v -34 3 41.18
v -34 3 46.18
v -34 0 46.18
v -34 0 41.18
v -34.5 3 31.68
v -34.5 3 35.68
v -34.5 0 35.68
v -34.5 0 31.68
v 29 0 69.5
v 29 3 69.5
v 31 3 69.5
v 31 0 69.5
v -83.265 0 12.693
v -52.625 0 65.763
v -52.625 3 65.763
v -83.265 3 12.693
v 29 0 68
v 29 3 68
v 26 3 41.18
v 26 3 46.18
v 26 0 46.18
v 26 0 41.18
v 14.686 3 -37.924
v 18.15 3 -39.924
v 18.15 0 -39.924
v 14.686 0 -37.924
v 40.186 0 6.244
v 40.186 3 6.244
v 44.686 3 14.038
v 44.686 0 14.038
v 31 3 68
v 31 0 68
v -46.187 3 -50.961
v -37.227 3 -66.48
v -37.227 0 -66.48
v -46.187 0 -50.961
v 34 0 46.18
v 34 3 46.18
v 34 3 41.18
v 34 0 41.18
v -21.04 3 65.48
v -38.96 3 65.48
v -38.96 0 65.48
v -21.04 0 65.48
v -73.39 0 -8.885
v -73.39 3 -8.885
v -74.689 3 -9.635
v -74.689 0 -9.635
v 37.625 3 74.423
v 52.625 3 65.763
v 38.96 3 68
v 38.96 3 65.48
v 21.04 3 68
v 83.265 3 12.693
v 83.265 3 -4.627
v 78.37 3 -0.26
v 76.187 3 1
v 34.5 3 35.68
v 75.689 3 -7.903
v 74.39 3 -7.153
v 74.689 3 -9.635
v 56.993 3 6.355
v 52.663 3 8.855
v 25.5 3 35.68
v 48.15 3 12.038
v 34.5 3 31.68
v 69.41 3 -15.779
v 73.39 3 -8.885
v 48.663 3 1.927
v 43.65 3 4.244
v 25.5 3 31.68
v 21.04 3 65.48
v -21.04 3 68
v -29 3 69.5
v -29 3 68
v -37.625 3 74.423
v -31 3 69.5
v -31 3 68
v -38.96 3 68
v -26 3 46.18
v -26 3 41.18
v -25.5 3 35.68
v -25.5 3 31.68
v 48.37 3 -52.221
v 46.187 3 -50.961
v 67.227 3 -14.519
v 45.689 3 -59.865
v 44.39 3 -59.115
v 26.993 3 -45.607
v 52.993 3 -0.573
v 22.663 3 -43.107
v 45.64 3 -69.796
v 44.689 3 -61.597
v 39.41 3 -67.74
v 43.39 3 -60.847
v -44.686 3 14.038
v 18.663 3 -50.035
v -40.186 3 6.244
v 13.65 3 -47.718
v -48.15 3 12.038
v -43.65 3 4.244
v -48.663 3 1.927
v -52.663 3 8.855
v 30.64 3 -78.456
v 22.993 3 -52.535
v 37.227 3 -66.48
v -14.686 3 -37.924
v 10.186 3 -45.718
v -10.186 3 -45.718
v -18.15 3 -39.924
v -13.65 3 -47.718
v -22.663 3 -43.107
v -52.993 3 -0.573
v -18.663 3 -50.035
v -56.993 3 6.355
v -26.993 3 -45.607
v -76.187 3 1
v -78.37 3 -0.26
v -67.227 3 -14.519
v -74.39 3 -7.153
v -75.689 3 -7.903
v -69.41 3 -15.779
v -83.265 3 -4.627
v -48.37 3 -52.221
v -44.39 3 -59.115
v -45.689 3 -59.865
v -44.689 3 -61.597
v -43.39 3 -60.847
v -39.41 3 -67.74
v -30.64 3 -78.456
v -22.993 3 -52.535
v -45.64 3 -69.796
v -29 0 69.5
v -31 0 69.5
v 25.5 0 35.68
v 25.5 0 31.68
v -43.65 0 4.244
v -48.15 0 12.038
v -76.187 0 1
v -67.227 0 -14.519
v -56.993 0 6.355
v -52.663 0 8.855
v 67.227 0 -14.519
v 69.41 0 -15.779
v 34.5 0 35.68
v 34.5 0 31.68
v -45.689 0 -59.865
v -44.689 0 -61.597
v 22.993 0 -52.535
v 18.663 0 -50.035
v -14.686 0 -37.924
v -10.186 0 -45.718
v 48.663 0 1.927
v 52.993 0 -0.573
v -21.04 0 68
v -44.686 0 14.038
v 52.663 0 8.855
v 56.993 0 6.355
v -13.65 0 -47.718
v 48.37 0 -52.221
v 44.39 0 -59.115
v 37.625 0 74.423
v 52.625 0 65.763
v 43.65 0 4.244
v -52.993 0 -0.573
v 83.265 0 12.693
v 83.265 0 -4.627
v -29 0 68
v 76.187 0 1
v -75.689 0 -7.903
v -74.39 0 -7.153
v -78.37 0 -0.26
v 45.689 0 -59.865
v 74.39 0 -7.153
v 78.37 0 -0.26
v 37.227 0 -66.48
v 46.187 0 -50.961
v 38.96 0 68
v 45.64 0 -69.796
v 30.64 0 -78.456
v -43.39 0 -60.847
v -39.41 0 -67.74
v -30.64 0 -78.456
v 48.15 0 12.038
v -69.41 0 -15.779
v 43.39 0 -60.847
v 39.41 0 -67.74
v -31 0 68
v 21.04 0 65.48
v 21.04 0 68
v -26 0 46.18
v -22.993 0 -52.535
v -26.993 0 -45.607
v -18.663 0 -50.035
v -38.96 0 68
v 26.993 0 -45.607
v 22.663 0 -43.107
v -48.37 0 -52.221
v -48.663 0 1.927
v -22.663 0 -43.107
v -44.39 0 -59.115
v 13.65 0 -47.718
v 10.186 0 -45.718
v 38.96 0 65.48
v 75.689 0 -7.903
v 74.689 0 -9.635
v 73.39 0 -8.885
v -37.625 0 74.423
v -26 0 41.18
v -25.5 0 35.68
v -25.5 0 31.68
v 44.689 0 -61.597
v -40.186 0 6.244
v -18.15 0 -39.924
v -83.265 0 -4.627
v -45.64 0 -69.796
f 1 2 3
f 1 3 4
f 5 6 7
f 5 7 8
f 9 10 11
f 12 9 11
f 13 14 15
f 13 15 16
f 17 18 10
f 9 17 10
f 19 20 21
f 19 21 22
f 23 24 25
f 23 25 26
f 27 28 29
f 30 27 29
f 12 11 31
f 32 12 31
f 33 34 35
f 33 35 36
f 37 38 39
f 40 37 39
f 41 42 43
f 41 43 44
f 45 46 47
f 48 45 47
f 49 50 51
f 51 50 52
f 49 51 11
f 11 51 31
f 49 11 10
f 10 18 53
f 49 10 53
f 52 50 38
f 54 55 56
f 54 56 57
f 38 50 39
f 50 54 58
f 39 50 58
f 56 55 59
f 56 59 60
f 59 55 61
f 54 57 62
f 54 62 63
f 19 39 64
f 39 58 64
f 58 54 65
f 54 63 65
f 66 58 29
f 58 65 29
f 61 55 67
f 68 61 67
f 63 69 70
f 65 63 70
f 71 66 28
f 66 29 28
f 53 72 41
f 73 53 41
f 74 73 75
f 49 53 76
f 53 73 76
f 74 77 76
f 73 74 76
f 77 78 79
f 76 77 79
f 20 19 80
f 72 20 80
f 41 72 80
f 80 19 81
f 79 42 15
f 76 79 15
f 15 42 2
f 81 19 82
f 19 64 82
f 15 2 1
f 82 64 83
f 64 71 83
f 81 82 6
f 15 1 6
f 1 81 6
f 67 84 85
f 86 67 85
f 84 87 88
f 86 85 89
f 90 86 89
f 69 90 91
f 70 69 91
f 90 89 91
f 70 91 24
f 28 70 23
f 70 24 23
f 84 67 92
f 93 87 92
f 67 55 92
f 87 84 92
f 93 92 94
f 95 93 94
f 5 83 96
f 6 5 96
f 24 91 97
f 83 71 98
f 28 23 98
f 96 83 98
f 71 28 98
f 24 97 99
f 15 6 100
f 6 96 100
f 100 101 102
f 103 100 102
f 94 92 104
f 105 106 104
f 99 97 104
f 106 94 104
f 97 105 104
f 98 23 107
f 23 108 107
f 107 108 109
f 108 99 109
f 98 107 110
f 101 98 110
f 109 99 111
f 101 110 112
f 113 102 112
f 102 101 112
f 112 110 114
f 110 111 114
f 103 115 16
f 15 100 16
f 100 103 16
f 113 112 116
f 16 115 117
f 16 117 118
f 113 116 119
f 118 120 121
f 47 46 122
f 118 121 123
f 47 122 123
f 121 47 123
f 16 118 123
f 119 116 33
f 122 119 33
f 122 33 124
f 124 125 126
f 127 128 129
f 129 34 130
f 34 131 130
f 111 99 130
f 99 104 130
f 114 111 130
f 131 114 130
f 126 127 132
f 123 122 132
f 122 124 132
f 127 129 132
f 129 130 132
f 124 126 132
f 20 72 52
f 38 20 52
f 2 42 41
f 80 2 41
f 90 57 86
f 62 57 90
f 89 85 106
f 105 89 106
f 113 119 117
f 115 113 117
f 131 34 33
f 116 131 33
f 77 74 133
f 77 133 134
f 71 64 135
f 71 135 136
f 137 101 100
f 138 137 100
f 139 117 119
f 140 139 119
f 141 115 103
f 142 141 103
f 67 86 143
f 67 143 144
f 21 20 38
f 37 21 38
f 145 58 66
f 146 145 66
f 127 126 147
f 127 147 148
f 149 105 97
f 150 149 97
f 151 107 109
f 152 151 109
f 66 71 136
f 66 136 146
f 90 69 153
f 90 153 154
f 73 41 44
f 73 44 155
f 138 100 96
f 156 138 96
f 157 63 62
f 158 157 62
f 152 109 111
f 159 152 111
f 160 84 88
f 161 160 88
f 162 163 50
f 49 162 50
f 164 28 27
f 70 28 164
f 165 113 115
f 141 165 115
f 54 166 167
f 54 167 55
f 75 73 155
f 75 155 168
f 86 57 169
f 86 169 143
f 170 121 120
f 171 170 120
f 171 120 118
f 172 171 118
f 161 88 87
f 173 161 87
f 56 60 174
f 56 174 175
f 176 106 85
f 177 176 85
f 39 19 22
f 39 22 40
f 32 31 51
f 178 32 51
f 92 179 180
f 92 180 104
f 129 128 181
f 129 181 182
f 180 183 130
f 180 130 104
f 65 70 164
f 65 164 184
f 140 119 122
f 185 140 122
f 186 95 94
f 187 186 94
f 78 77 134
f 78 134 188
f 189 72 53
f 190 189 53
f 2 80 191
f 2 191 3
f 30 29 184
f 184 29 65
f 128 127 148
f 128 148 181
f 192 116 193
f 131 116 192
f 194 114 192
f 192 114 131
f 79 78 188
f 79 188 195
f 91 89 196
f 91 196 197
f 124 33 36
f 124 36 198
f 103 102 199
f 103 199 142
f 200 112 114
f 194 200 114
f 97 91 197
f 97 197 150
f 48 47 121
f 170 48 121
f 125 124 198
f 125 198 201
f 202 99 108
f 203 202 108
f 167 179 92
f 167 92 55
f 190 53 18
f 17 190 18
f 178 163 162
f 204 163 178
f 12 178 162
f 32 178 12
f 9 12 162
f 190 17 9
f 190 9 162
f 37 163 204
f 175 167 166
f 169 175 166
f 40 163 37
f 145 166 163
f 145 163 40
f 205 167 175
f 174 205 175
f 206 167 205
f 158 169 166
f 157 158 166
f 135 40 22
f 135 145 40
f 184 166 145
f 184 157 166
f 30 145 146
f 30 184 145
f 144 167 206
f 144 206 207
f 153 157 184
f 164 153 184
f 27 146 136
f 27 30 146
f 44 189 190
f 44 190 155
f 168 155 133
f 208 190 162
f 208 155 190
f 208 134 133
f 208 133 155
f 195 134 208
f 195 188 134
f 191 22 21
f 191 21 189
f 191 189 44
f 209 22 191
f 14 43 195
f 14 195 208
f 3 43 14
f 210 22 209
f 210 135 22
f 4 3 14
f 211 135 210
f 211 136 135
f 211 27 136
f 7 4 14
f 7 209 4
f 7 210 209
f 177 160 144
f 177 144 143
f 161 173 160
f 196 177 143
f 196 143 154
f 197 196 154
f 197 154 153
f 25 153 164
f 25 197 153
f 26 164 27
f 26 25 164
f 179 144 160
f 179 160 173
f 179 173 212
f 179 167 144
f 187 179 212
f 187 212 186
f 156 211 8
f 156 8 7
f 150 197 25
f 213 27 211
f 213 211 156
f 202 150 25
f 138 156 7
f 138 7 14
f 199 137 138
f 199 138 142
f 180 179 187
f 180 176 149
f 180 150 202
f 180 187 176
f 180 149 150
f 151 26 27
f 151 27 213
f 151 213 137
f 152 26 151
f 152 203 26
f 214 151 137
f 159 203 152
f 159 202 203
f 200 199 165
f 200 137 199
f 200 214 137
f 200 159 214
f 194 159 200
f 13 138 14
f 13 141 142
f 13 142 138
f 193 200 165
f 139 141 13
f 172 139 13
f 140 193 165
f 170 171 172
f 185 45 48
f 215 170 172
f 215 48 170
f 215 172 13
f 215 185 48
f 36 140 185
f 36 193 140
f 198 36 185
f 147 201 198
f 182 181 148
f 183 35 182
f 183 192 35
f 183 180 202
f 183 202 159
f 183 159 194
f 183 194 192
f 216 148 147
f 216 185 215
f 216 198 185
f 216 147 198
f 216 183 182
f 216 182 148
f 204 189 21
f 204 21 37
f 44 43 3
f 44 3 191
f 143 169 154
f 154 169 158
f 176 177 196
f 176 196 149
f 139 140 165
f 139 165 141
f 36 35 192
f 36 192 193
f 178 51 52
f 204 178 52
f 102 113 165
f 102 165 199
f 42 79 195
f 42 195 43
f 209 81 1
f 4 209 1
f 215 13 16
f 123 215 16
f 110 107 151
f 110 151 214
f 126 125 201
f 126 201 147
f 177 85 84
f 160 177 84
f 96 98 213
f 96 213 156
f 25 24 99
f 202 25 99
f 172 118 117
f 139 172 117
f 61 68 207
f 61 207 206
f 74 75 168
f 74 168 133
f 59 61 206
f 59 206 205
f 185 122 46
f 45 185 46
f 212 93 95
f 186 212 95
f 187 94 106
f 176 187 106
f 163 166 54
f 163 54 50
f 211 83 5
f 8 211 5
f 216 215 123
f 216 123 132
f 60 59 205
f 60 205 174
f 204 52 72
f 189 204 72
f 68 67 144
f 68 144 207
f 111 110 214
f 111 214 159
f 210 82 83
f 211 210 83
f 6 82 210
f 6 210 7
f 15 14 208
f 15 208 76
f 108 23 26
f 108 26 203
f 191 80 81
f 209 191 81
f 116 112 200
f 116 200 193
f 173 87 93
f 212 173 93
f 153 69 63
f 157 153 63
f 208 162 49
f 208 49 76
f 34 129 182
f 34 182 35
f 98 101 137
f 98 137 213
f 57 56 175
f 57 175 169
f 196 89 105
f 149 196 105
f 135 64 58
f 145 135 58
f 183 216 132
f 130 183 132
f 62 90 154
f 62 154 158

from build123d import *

# Parameters (mm, degrees)
BOSS_EXTRUDE1_DEPTH           = 3
CUT_EXTRUDE1_DEPTH            = 119.131594354
SKETCH4_W                     = 8
SKETCH4_H                     = 5
SKETCH4_W_2                   = 9
SKETCH4_H_2                   = 4
CUT_EXTRUDE2_DEPTH            = 119.131594354
CIRPATTERN1_COUNT             = 3
CIRPATTERN1_COPY_1_DEPTH      = 119.131594354
CIRPATTERN1_COPY_2_DEPTH      = 119.131594354
CIRPATTERN1_COPY_3_SKETCH_W   = 8
CIRPATTERN1_COPY_3_SKETCH_H   = 5
CIRPATTERN1_COPY_3_SKETCH_W_2 = 9
CIRPATTERN1_COPY_3_SKETCH_H_2 = 4
CIRPATTERN1_COPY_3_DEPTH      = 119.131594354
CIRPATTERN1_COPY_4_SKETCH_W   = 8
CIRPATTERN1_COPY_4_SKETCH_H   = 5
CIRPATTERN1_COPY_4_SKETCH_W_2 = 9
CIRPATTERN1_COPY_4_SKETCH_H_2 = 4
CIRPATTERN1_COPY_4_DEPTH      = 119.131594354
CHAMFER1_SIZE                 = 10


with BuildPart() as part:
    # Sketch1 → Boss-Extrude1 (new body)
    with BuildSketch(Plane(origin=(0, 0, 0), x_dir=(1, 0, 0), z_dir=(0, 1, 0))):
        Polygon((-40.639997478, 78.456126624), (40.640002522, 78.456126624), (88.264992433, -4.032793087), (47.625005045, -74.423333537), (-47.625, -74.423333537), (-88.264997478, -4.032793087), align=None)
    extrude(amount=BOSS_EXTRUDE1_DEPTH)

    # Sketch2 → Cut-Extrude1 (cut, through all)
    with BuildSketch(Plane(origin=(0, 3, 0), x_dir=(1, 0, 0), z_dir=(0, 1, 0))):
        Polygon((29, -68), (29, -69.5), (31, -69.5), (31, -68), (38.96, -68), (38.96, -65.48), (21.04, -65.48), (21.04, -68), align=None)
    cut_extrude1 = extrude(amount=-CUT_EXTRUDE1_DEPTH, mode=Mode.SUBTRACT)

    # Sketch4 → Cut-Extrude2 (cut, through all)
    with BuildSketch(Plane(origin=(0, 3, 0), x_dir=(1, 0, 0), z_dir=(0, 1, 0))):
        with Locations((30, -43.68)):
            Rectangle(SKETCH4_W, SKETCH4_H)
        with Locations((30, -33.68)):
            Rectangle(SKETCH4_W_2, SKETCH4_H_2)
    cut_extrude2 = extrude(amount=-CUT_EXTRUDE2_DEPTH, mode=Mode.SUBTRACT)

    # Mirror1: Cut-Extrude1, Cut-Extrude2 across plane
    add(cut_extrude1.mirror(Plane(origin=(0, 0, 0), x_dir=(0, 0, 1), z_dir=(1, 0, 0))), mode=Mode.SUBTRACT)
    add(cut_extrude2.mirror(Plane(origin=(0, 0, 0), x_dir=(0, 0, 1), z_dir=(1, 0, 0))), mode=Mode.SUBTRACT)

    # CirPattern1: Cut-Extrude1, Cut-Extrude2 ×3 about axis
    cirpattern1_axis = Axis((0, 0, 0), (0, 1, 0))
    add([cut_extrude1.rotate(cirpattern1_axis, i * 360 / CIRPATTERN1_COUNT) for i in range(1, CIRPATTERN1_COUNT)], mode=Mode.SUBTRACT)
    add([cut_extrude2.rotate(cirpattern1_axis, i * 360 / CIRPATTERN1_COUNT) for i in range(1, CIRPATTERN1_COUNT)], mode=Mode.SUBTRACT)

    # CirPattern1 copy 1 sketch → CirPattern1 copy 1 (cut, through all)
    with BuildSketch(Plane(origin=(0, 3, 0), x_dir=(0.4999999999999998, 0, 0.8660254037844387), z_dir=(0, 1, 0))):
        Polygon((29, 68), (29, 69.5), (31, 69.5), (31, 68), (38.96, 68), (38.96, 65.48), (21.04, 65.48), (21.04, 68), align=None)
    extrude(amount=-CIRPATTERN1_COPY_1_DEPTH, mode=Mode.SUBTRACT)

    # CirPattern1 copy 2 sketch → CirPattern1 copy 2 (cut, through all)
    with BuildSketch(Plane(origin=(0, 3, 0), x_dir=(0.5000000000000004, 0, -0.8660254037844384), z_dir=(0, 1, 0))):
        Polygon((29, 68), (29, 69.5), (31, 69.5), (31, 68), (38.96, 68), (38.96, 65.48), (21.04, 65.48), (21.04, 68), align=None)
    extrude(amount=-CIRPATTERN1_COPY_2_DEPTH, mode=Mode.SUBTRACT)

    # CirPattern1 copy 3 sketch → CirPattern1 copy 3 (cut, through all)
    with BuildSketch(Plane(origin=(0, 3, 0), x_dir=(0.4999999999999998, 0, 0.8660254037844387), z_dir=(0, 1, 0))):
        with Locations((30, 43.68)):
            Rectangle(CIRPATTERN1_COPY_3_SKETCH_W, CIRPATTERN1_COPY_3_SKETCH_H)
        with Locations((30, 33.68)):
            Rectangle(CIRPATTERN1_COPY_3_SKETCH_W_2, CIRPATTERN1_COPY_3_SKETCH_H_2)
    extrude(amount=-CIRPATTERN1_COPY_3_DEPTH, mode=Mode.SUBTRACT)

    # CirPattern1 copy 4 sketch → CirPattern1 copy 4 (cut, through all)
    with BuildSketch(Plane(origin=(0, 3, 0), x_dir=(0.5000000000000004, 0, -0.8660254037844384), z_dir=(0, 1, 0))):
        with Locations((30, 43.68)):
            Rectangle(CIRPATTERN1_COPY_4_SKETCH_W, CIRPATTERN1_COPY_4_SKETCH_H)
        with Locations((30, 33.68)):
            Rectangle(CIRPATTERN1_COPY_4_SKETCH_W_2, CIRPATTERN1_COPY_4_SKETCH_H_2)
    extrude(amount=-CIRPATTERN1_COPY_4_DEPTH, mode=Mode.SUBTRACT)

    # Chamfer1
    chamfer1_edges = [part.edges().sort_by_distance(p)[0] for p in [
        (-40.639997478, 1.5, -78.456126624),
        (40.640002522, 1.5, -78.456126624),
        (88.264992433, 1.5, 4.032793087),
        (47.625005045, 1.5, 74.423333537),
        (-47.625, 1.5, 74.423333537),
        (-88.264997478, 1.5, 4.032793087),
    ]]
    chamfer(chamfer1_edges, length=CHAMFER1_SIZE)


solid = part.part
